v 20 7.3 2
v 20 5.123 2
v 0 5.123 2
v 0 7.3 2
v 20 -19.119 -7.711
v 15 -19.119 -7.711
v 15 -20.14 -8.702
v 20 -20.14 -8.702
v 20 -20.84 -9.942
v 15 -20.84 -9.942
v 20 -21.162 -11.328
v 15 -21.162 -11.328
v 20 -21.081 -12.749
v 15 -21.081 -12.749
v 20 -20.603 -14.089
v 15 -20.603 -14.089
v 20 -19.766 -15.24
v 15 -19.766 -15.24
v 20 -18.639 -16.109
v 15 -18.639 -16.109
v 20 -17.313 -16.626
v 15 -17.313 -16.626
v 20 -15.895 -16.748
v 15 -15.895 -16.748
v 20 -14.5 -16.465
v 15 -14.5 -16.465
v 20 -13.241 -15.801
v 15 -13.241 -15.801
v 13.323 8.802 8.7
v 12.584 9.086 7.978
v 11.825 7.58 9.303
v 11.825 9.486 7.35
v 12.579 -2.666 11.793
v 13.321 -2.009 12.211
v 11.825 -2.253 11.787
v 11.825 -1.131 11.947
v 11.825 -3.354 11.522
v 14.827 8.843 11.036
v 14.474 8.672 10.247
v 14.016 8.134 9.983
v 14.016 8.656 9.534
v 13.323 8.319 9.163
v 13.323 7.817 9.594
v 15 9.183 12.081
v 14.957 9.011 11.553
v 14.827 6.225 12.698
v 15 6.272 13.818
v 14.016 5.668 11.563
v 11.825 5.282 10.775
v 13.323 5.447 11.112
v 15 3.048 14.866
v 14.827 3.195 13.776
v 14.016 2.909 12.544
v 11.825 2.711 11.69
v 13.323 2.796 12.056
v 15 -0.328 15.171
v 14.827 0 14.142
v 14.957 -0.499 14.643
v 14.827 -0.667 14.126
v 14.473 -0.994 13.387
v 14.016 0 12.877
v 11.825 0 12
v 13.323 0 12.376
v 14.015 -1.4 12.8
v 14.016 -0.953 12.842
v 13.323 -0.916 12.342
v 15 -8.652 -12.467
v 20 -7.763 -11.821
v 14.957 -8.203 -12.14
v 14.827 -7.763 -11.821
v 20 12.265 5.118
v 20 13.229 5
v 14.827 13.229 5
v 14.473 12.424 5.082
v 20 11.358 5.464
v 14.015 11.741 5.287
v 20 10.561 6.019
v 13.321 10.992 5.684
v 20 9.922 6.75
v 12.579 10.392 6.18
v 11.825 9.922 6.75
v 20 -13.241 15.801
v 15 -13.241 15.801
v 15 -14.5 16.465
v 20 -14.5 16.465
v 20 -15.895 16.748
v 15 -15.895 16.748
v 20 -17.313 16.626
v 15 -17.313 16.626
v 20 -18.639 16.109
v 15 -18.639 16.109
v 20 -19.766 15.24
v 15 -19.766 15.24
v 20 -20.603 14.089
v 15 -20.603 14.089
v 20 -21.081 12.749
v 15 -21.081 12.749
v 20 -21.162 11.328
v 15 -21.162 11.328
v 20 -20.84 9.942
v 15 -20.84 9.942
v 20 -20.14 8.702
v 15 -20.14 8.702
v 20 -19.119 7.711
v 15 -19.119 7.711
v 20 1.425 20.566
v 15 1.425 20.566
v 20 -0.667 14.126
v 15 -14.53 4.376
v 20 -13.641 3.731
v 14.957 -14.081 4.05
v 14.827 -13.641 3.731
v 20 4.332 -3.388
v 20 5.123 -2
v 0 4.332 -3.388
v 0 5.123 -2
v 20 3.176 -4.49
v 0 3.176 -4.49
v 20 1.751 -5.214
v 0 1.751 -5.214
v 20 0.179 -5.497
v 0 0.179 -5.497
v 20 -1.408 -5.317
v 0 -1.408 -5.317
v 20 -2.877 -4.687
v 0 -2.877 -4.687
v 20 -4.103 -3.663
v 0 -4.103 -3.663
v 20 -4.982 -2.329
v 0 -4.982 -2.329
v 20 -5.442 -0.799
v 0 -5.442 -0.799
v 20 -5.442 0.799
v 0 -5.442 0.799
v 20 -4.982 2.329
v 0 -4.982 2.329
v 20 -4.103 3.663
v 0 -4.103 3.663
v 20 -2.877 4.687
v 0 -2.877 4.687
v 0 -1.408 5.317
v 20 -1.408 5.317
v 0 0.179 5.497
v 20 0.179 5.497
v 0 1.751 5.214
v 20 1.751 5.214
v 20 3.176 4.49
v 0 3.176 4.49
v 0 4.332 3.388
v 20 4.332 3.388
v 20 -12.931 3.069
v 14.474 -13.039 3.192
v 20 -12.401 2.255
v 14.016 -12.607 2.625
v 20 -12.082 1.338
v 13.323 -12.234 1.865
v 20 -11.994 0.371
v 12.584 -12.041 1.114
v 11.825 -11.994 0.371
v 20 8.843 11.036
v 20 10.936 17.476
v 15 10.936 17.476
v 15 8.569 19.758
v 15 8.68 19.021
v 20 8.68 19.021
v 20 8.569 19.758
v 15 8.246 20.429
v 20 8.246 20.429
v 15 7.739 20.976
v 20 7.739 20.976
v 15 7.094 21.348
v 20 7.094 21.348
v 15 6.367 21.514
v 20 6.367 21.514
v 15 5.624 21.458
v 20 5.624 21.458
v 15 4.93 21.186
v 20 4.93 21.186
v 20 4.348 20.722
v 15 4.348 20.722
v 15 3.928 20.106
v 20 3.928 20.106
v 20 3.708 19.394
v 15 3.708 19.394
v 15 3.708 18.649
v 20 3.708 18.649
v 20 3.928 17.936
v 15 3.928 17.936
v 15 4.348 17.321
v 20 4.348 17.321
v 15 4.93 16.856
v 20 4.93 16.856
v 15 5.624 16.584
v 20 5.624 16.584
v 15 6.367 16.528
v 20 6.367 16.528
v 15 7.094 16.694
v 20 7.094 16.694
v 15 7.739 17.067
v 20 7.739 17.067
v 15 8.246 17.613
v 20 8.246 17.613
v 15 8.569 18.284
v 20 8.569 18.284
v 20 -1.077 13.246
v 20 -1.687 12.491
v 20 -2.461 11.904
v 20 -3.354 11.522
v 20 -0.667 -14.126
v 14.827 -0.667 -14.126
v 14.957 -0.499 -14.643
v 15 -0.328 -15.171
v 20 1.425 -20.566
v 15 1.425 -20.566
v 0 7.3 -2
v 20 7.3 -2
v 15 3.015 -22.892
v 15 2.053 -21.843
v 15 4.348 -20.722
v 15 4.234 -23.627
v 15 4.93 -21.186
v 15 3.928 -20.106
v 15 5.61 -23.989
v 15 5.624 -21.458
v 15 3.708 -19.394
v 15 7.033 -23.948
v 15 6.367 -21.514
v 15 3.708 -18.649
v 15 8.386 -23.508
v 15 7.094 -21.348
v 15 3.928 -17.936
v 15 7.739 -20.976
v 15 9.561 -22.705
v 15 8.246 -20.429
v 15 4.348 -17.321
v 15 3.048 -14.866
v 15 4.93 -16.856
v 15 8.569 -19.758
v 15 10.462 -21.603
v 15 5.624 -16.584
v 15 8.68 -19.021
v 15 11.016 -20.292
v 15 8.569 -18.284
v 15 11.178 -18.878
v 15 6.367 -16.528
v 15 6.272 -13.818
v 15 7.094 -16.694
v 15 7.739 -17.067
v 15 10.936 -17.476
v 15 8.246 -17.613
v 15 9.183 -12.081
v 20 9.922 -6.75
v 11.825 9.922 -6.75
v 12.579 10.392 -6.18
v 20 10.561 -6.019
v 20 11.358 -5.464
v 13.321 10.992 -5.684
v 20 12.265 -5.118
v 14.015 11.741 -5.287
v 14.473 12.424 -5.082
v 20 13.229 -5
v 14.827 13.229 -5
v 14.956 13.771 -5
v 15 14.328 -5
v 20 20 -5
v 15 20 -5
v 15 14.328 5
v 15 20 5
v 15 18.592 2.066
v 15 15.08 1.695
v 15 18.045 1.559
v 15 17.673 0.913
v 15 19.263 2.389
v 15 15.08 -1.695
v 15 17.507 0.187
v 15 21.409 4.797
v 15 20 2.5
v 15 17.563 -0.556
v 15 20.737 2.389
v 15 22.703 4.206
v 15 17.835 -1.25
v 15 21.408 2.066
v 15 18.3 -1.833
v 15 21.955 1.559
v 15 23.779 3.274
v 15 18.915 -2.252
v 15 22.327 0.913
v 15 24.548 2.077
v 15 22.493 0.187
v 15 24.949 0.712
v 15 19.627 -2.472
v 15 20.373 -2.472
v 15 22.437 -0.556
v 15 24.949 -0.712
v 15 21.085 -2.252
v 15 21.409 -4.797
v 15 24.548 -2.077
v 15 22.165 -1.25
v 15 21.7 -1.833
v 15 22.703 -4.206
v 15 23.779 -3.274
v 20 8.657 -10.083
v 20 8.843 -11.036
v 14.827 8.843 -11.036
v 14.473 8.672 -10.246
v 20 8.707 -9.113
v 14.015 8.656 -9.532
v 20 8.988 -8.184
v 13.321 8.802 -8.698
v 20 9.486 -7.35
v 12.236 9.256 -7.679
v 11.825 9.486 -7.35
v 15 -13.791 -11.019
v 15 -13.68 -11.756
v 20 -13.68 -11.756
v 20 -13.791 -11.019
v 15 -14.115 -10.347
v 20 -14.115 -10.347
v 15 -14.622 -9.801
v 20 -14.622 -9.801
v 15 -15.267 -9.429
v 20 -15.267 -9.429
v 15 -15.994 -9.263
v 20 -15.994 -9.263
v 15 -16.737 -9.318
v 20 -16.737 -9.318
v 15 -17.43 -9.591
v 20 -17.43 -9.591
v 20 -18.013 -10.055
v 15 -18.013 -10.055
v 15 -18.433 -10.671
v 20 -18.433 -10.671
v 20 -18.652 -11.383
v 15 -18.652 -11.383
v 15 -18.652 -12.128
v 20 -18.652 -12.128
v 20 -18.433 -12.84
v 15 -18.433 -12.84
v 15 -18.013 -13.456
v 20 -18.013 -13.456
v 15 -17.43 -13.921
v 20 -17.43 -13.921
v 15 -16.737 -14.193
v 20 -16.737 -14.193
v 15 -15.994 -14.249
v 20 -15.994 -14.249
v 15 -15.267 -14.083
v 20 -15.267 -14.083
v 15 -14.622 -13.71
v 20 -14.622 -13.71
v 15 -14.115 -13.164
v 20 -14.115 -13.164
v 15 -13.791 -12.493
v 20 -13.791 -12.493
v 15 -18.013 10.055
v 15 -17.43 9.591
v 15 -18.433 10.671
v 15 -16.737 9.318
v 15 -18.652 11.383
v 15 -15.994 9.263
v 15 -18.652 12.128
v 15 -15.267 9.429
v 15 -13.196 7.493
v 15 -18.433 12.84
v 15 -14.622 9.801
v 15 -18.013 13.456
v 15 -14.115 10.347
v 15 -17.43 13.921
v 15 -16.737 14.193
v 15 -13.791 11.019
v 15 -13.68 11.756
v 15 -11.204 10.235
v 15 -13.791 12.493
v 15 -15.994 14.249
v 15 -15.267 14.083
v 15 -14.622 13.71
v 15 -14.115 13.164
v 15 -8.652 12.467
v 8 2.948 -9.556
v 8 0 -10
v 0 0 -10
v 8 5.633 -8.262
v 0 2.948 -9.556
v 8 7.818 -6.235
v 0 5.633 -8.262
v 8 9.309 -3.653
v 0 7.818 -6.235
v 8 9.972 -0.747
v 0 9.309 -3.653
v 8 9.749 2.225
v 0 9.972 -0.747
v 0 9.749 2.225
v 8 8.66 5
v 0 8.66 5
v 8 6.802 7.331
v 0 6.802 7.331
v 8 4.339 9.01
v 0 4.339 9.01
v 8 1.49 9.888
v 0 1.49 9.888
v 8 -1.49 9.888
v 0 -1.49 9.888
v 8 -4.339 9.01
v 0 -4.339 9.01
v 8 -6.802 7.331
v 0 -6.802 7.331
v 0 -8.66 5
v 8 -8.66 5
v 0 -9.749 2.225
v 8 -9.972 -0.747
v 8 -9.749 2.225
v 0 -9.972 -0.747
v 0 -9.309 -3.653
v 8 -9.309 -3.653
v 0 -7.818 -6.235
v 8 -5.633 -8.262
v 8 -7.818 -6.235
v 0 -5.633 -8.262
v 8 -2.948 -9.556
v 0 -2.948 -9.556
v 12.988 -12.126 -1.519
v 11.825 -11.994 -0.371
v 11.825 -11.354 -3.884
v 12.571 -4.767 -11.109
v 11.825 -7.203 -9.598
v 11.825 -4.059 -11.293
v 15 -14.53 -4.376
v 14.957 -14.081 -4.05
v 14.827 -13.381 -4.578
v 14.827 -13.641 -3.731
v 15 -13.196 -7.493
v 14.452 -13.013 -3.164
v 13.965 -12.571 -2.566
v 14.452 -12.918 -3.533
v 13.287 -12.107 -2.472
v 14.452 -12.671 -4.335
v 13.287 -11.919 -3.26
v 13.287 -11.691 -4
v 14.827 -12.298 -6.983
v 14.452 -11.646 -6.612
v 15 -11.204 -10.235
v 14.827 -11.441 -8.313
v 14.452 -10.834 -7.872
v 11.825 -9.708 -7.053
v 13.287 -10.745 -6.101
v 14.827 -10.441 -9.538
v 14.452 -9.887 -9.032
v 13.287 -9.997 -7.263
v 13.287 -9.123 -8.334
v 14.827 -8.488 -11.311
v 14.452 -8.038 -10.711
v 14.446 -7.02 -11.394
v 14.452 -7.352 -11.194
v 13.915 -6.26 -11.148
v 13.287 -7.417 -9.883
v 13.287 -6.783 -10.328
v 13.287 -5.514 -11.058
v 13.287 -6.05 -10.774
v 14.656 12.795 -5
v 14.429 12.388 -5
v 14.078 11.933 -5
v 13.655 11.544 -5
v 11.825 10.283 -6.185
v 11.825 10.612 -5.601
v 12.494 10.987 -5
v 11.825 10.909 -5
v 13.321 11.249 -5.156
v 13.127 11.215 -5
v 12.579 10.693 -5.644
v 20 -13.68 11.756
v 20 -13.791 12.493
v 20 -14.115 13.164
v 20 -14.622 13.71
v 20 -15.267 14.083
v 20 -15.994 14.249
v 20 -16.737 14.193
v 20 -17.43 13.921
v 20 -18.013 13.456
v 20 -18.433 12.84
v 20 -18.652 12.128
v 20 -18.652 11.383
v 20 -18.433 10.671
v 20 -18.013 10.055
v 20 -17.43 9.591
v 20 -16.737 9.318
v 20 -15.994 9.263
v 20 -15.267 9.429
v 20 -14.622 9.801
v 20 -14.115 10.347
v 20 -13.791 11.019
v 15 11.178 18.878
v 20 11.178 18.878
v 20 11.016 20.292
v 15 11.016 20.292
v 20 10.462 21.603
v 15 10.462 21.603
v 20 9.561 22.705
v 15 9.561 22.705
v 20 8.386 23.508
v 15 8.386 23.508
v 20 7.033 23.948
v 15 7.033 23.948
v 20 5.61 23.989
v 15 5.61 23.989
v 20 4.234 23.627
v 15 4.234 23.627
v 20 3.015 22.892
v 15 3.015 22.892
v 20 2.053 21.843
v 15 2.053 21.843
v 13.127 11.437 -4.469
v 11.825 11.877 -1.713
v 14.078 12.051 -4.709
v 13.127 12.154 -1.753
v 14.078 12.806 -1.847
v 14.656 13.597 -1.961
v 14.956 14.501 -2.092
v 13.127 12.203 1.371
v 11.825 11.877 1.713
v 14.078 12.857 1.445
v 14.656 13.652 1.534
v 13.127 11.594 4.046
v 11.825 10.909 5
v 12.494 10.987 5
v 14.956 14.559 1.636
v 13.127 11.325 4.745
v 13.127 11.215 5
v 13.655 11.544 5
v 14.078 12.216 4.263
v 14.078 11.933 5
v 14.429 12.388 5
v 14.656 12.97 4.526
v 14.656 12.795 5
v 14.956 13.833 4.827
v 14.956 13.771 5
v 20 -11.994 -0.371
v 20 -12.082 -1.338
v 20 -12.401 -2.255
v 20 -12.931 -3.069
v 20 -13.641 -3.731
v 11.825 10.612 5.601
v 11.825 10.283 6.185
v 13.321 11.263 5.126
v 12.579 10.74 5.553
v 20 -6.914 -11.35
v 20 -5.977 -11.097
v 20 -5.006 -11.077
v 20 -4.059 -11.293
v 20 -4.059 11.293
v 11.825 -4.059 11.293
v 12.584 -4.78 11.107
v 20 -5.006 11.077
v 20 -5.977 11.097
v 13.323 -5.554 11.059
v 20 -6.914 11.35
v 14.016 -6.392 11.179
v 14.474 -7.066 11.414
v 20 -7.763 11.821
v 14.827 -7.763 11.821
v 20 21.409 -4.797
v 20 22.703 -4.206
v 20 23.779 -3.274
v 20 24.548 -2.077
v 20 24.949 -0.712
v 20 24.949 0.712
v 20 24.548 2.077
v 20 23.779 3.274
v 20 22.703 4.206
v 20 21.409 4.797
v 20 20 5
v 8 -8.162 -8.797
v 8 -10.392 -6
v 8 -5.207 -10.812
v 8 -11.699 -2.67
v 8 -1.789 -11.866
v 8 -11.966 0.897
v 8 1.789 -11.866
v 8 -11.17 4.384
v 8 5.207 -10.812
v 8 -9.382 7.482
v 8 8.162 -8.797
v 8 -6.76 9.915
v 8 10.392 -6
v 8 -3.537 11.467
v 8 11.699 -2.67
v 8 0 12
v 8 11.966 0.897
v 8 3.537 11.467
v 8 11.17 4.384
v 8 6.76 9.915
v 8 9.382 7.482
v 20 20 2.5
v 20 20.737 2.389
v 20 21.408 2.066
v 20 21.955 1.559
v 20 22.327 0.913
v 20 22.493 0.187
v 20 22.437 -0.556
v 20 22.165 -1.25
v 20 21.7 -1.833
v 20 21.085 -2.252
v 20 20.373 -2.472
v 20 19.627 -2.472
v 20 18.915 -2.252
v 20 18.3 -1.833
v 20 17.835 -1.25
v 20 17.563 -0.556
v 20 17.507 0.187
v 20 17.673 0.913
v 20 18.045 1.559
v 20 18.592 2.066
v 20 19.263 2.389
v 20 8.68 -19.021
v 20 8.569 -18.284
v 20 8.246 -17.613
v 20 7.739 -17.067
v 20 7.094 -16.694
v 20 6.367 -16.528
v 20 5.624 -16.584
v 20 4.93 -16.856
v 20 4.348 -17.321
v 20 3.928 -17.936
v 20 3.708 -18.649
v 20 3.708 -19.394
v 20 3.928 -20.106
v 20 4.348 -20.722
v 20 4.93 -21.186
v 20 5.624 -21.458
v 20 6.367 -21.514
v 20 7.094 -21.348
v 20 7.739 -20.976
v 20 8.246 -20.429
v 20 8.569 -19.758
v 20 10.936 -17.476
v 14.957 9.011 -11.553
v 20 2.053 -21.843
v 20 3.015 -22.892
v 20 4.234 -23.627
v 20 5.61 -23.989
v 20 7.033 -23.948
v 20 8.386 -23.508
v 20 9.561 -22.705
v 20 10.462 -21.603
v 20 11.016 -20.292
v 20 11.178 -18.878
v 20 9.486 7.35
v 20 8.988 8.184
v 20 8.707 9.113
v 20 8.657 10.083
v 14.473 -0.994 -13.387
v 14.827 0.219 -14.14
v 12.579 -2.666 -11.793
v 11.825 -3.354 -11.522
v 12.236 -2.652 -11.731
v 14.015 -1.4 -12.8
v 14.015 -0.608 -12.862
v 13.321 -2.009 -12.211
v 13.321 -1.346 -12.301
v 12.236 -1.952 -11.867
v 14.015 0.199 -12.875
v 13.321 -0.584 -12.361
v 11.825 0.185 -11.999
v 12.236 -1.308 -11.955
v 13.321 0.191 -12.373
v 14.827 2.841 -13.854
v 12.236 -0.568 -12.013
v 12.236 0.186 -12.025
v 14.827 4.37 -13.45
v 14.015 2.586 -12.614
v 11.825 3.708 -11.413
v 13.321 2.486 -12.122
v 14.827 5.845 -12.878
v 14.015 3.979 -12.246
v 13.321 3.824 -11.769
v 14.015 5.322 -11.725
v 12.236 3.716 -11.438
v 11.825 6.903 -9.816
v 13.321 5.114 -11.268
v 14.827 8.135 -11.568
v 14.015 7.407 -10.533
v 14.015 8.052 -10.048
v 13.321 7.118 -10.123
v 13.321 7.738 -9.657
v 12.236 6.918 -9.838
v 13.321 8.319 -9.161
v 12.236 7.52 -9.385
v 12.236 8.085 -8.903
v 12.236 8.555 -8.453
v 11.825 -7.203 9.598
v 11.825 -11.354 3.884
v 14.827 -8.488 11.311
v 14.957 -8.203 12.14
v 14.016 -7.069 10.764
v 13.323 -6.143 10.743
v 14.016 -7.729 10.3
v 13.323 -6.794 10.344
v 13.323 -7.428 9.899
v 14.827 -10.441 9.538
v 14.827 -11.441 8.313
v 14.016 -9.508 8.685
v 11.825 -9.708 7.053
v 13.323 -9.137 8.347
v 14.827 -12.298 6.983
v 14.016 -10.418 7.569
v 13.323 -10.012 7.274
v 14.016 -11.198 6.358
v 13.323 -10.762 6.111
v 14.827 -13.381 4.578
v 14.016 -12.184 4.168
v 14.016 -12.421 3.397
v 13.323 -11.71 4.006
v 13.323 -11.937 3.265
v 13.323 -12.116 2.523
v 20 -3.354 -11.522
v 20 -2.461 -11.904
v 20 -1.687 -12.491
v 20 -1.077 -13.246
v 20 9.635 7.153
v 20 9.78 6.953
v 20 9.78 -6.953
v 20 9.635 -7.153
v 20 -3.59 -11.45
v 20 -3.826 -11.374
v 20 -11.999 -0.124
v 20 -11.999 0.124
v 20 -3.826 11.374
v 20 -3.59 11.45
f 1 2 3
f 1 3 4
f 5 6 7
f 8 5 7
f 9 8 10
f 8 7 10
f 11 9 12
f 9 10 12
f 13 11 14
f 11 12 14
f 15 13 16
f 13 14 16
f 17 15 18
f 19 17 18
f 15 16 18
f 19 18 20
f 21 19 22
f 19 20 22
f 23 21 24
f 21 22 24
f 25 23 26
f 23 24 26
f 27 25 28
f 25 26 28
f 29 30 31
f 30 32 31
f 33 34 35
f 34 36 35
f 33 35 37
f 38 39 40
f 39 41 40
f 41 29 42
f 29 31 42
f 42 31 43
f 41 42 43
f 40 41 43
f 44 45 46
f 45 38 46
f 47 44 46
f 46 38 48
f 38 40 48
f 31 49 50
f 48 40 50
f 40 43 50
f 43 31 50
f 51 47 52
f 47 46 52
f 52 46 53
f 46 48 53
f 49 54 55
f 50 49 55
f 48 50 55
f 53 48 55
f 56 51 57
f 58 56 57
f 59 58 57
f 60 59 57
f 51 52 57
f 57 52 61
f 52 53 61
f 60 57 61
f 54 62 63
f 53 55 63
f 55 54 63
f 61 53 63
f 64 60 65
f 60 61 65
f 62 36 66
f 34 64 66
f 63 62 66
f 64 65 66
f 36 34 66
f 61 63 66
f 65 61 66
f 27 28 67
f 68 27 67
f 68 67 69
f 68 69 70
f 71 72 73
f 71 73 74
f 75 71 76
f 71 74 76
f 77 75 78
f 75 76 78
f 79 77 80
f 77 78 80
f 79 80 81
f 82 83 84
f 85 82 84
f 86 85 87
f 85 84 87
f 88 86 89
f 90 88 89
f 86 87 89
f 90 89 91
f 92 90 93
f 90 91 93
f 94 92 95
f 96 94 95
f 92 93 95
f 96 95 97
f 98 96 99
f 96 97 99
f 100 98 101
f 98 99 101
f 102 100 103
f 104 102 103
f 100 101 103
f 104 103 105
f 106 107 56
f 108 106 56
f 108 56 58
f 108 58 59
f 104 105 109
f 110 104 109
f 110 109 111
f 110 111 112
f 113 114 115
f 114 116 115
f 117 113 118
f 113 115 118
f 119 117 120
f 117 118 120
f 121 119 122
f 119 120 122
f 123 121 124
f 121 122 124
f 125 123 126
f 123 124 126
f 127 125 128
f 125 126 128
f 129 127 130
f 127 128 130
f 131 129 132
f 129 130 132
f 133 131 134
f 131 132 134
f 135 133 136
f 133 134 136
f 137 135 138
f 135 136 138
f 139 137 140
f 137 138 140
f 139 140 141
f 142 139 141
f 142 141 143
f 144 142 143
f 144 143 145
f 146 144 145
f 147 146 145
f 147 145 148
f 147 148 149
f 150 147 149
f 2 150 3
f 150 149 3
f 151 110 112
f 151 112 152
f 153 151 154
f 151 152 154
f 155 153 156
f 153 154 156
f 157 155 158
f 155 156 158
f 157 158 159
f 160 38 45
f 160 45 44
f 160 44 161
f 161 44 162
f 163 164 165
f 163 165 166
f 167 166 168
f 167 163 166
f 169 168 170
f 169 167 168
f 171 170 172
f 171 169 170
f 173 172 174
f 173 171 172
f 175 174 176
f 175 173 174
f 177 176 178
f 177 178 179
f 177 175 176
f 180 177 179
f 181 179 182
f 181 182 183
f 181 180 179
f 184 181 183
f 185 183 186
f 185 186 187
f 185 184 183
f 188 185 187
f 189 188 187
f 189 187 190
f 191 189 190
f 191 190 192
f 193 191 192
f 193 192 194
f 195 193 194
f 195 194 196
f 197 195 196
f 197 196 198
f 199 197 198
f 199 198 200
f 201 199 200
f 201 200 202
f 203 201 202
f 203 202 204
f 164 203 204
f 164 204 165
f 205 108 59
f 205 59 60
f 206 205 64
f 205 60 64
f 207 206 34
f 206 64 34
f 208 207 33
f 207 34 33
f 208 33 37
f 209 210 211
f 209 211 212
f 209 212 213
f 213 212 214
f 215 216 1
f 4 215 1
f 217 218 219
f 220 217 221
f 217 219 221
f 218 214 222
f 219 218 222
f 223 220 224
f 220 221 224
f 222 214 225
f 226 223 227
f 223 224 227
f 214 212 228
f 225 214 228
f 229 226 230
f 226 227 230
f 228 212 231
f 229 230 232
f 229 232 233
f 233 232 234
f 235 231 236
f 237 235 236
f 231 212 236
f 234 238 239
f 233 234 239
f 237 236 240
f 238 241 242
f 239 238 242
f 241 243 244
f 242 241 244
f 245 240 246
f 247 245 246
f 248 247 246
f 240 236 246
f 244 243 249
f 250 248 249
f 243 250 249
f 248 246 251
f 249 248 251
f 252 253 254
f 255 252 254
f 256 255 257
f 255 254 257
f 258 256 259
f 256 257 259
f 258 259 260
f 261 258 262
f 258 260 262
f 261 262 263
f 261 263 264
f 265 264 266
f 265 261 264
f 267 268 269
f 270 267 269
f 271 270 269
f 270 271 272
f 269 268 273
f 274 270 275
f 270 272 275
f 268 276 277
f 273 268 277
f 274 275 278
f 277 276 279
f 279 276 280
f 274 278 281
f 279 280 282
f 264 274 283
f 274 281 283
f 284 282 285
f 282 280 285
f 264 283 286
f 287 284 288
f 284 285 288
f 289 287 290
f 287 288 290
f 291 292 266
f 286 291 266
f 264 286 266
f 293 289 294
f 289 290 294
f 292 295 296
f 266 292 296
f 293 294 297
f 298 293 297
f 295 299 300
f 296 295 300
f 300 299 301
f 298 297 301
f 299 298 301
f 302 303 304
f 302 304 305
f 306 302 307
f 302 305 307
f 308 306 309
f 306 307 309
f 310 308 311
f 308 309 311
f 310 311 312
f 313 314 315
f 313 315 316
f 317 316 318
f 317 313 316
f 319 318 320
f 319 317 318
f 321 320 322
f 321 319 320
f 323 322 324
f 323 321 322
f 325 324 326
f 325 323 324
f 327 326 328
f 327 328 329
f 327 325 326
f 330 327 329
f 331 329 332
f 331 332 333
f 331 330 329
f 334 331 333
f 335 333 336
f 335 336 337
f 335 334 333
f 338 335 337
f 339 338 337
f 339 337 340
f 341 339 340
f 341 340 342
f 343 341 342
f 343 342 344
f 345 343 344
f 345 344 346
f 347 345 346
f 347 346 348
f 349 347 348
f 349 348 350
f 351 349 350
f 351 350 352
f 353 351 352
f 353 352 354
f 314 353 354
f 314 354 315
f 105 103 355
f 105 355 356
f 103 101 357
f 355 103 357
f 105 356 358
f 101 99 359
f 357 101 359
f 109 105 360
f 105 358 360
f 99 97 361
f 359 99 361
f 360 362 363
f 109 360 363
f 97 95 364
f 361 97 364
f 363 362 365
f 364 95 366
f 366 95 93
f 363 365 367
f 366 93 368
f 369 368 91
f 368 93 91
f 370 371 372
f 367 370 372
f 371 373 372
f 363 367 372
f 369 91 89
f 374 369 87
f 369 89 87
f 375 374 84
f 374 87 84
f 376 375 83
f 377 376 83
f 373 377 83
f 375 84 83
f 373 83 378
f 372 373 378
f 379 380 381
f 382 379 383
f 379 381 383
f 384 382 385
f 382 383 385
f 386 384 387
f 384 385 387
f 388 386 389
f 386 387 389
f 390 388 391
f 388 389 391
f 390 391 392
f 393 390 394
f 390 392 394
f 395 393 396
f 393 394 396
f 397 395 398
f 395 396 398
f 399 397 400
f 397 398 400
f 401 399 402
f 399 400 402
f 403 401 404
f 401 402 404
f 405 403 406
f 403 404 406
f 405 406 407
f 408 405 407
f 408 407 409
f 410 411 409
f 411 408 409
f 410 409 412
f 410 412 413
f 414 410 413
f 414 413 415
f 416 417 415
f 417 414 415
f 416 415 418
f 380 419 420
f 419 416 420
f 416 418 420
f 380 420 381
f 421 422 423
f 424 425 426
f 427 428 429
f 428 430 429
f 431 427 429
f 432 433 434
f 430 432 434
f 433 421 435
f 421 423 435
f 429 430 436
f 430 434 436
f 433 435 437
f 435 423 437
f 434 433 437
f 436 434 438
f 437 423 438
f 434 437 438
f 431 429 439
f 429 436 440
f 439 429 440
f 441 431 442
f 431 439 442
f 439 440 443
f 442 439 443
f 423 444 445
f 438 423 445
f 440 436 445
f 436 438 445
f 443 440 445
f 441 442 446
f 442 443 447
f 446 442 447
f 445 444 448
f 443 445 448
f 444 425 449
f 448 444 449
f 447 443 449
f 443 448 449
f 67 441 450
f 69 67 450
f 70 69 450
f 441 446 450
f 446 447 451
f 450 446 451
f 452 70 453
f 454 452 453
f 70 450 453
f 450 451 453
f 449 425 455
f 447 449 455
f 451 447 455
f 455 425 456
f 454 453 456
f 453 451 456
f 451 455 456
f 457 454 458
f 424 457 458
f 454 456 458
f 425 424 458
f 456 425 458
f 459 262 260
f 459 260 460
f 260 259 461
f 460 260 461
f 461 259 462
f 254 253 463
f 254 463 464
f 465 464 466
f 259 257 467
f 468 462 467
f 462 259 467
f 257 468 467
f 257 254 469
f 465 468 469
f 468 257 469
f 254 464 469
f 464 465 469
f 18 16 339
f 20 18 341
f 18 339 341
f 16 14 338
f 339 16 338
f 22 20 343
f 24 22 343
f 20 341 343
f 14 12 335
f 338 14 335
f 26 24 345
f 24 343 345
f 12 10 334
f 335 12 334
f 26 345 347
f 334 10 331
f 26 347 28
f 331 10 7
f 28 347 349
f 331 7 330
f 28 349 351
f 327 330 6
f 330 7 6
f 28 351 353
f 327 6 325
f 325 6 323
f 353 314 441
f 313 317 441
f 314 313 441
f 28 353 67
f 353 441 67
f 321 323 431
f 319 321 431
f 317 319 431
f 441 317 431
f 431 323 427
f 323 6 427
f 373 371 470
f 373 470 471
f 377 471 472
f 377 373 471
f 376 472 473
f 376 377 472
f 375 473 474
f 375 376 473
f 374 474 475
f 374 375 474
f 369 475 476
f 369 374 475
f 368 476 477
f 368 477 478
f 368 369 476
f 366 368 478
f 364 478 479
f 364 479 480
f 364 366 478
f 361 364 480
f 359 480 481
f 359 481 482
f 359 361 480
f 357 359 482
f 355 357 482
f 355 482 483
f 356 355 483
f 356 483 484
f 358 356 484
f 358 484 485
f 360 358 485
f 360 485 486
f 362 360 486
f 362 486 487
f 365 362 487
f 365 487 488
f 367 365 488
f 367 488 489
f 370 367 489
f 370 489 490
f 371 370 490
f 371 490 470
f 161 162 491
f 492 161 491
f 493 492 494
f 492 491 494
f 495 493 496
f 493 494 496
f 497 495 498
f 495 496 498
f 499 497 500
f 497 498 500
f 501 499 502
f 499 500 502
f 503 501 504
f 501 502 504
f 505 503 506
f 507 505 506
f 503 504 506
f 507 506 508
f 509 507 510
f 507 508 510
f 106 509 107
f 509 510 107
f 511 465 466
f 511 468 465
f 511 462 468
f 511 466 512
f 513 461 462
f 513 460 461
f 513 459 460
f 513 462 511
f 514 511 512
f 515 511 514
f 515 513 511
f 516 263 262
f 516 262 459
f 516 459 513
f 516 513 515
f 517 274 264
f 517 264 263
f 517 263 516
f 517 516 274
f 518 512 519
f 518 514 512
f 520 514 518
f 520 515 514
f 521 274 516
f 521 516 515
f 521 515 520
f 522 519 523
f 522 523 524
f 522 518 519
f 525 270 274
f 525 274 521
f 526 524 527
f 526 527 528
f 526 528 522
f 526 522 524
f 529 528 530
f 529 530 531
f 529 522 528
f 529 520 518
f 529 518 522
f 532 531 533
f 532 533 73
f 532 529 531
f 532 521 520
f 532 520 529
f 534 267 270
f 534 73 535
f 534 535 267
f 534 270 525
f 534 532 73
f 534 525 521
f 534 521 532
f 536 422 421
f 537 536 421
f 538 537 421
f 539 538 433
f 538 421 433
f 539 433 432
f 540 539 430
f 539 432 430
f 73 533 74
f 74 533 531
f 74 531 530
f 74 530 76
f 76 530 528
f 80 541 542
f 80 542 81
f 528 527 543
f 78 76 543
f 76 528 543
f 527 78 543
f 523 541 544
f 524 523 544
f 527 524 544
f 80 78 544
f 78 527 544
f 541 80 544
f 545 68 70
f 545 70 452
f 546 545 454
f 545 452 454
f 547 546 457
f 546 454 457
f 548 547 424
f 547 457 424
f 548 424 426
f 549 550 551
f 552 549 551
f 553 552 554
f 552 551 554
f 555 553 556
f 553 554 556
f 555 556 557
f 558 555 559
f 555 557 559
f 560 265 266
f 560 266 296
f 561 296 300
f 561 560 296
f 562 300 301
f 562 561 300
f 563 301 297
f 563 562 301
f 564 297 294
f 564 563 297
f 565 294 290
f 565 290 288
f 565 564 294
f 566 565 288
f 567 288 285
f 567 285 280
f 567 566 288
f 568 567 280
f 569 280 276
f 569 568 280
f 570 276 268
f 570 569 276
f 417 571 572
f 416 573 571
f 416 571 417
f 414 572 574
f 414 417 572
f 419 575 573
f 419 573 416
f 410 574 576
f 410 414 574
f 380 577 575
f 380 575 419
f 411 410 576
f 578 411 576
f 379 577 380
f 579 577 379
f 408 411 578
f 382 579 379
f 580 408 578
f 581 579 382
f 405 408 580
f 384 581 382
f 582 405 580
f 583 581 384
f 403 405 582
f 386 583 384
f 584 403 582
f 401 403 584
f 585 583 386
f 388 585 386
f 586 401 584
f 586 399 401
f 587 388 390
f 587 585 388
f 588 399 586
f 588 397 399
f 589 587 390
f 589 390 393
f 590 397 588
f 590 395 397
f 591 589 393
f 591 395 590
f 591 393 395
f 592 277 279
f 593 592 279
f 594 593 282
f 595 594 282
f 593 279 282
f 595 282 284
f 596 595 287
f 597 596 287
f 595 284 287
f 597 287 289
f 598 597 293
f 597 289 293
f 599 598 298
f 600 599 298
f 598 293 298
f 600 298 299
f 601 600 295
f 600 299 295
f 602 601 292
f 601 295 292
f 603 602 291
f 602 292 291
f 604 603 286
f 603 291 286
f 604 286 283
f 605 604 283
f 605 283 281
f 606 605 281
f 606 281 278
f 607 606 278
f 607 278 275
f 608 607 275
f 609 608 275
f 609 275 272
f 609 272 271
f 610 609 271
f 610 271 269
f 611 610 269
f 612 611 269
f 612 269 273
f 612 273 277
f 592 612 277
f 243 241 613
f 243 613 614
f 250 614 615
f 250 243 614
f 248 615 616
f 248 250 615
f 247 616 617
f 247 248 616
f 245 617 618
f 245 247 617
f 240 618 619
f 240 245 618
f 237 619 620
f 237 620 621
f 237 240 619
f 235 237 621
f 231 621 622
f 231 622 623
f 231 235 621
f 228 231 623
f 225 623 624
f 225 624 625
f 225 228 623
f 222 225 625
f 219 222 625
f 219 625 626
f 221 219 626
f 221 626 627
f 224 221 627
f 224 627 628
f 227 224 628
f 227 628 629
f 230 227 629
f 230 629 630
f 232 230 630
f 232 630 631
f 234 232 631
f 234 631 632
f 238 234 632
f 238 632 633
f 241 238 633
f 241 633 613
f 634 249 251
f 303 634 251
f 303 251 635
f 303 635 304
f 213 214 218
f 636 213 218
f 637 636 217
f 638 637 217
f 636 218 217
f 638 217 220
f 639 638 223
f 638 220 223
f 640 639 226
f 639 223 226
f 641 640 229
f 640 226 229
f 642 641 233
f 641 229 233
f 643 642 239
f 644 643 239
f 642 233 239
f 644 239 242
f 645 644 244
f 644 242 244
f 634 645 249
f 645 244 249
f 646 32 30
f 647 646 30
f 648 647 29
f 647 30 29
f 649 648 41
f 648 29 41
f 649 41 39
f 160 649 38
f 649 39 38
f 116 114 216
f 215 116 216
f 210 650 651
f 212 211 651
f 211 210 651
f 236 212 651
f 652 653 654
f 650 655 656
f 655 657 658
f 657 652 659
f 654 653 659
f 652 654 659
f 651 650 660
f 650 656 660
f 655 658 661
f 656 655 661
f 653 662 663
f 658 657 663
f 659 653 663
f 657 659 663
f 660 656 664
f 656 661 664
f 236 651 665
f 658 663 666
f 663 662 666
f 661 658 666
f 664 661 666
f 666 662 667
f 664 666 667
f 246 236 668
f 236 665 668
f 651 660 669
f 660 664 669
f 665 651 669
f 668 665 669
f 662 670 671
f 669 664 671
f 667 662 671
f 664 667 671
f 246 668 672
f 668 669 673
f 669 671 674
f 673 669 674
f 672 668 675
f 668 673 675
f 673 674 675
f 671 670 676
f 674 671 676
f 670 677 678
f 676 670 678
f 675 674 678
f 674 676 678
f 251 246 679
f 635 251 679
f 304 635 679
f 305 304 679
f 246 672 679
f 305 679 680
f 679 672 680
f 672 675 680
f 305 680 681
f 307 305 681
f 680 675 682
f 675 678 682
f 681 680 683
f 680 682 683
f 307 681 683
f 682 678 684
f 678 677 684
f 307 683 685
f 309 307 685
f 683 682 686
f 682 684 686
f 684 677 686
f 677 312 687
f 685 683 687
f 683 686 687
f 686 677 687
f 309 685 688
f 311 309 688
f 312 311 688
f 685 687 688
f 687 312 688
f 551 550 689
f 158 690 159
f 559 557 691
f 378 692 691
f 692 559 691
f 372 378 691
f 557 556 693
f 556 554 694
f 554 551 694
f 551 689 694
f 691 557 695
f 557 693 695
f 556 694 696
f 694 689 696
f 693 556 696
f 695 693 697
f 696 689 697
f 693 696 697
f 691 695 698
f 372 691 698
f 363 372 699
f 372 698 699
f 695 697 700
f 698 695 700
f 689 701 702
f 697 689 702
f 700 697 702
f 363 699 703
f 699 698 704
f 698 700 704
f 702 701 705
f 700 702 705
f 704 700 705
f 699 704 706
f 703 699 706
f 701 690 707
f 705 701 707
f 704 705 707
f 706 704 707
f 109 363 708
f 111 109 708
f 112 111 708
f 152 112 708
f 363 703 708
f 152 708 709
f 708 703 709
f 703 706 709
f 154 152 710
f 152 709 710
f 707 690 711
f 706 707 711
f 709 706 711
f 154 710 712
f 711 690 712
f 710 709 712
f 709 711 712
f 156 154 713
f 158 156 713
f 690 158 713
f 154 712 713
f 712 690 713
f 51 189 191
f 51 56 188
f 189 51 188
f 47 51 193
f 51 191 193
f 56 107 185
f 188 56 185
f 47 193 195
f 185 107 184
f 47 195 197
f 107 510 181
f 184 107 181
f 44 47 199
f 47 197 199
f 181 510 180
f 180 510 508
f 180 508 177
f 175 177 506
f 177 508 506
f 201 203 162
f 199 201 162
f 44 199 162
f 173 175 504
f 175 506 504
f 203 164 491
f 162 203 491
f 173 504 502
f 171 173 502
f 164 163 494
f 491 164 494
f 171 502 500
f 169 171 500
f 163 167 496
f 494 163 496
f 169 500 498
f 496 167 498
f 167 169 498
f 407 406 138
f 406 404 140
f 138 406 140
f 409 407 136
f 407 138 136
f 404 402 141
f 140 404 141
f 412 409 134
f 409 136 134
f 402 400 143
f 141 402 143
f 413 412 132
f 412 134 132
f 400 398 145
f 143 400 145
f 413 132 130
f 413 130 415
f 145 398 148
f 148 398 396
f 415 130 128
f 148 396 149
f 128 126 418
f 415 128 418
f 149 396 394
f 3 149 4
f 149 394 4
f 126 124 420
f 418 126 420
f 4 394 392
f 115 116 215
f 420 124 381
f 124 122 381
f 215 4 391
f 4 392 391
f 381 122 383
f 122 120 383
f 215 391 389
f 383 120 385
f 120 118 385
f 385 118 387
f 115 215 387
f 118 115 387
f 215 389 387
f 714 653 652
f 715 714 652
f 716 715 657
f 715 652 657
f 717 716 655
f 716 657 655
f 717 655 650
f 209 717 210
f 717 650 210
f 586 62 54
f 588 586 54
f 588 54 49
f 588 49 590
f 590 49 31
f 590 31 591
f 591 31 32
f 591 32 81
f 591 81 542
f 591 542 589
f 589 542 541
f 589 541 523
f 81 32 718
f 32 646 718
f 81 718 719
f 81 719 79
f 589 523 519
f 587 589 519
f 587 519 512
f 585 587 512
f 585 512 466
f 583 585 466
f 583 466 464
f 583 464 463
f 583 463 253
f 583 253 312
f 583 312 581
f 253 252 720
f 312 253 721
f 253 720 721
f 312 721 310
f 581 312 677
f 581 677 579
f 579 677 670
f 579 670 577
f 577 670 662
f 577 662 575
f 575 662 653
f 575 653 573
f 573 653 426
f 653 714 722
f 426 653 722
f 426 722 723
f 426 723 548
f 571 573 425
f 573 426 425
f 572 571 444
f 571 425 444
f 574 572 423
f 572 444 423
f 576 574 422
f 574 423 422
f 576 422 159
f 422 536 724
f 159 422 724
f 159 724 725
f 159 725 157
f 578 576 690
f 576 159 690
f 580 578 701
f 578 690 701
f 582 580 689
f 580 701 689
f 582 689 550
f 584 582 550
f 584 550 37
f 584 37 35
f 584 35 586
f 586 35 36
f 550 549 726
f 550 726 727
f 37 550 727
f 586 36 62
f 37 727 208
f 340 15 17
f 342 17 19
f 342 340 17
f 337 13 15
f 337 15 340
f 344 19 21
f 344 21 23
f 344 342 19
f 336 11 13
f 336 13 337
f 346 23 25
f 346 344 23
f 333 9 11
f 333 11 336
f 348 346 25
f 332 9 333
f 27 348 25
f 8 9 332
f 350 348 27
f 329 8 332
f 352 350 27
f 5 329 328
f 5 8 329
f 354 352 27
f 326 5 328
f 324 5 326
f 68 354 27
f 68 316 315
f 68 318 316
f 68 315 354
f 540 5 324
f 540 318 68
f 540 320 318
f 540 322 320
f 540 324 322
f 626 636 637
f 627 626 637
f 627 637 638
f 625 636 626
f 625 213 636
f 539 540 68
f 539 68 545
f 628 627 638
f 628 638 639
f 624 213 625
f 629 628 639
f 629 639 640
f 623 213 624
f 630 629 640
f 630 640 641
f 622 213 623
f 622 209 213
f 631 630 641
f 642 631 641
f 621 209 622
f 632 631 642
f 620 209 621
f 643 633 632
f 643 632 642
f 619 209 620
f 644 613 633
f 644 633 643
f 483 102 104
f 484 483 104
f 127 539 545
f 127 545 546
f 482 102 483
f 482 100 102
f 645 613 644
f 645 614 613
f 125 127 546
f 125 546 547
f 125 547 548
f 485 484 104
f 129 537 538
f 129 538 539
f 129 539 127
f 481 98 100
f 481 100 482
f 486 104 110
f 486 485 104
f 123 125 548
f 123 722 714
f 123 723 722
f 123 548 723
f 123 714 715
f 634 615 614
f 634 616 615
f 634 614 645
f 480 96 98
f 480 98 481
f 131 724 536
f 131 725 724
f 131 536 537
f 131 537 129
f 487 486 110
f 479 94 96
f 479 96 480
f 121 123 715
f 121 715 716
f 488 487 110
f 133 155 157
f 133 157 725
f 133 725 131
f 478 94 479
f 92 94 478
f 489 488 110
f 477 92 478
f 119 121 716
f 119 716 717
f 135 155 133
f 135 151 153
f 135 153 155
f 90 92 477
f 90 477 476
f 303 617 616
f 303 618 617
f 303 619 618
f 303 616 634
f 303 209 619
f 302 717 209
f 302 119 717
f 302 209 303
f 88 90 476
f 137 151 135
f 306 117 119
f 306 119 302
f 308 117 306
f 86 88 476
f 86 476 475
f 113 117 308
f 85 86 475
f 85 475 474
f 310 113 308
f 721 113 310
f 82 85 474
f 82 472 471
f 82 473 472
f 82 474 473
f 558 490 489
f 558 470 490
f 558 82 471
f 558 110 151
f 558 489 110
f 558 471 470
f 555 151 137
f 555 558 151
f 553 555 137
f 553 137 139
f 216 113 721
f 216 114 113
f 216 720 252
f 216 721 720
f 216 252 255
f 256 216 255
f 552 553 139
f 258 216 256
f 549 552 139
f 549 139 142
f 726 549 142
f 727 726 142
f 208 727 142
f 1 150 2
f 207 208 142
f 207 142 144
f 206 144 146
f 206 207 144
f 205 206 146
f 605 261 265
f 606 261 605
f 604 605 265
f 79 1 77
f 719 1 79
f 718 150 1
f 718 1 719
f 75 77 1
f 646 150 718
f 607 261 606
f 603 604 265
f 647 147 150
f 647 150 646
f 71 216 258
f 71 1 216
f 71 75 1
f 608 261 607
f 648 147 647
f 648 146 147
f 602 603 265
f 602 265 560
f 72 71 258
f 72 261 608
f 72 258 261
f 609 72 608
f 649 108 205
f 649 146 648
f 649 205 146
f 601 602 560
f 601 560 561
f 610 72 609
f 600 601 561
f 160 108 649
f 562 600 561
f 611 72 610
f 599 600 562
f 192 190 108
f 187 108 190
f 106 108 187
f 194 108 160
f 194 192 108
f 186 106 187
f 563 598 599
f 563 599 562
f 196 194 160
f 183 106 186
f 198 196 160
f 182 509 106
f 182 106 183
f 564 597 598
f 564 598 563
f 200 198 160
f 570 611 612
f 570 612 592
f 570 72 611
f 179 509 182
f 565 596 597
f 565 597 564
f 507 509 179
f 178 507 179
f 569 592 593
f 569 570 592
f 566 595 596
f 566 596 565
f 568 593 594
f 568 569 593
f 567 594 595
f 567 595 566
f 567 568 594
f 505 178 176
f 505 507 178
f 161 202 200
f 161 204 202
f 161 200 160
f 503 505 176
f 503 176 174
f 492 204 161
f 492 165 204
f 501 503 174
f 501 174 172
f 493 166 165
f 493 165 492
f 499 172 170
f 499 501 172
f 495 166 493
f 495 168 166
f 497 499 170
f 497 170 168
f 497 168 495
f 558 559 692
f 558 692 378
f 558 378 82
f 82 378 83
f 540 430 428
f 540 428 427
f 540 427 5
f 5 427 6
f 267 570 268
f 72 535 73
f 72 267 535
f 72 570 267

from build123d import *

# Parameters (mm, degrees)
SKETCH1_R                = 10
BOSS_EXTRUDE2_DEPTH      = 20
SKETCH5_R                = 12
BOSS_EXTRUDE3_DEPTH      = 12
BOSS_EXTRUDE4_DEPTH      = 5
FILLET2_R                = 3.175
F_5_0_5_DIAMETER_HOLE1_D = 5
FILLET1_START            = 15.0000001
FILLET1_DEPTH            = 4.9999999
FILLET1_START_2          = 11.8249999
FILLET1_2_DEPTH          = 3.1750001
CIRPATTERN6_START        = 11.8249999
CIRPATTERN6_OUTLINE_R    = 2.5
CIRPATTERN6_DEPTH        = 8.1750001
SKETCH2_R                = 5.5
SHAFT_HOLE_DEPTH         = 41.025175904
SKETCH3_W                = 4
SKETCH3_H                = 3.6
KEYWAY_DEPTH             = 41.025175904


with BuildPart() as part:
    # Sketch1 → Boss-Extrude2 (new body)
    with BuildSketch(Plane(origin=(0, 0, 0), x_dir=(0, 0, -1), z_dir=(1, 0, 0))):
        Circle(SKETCH1_R)
    extrude(amount=BOSS_EXTRUDE2_DEPTH)

    # Sketch5 → Boss-Extrude3 (add)
    with BuildSketch(Plane.ZY.offset(-20)):
        Circle(SKETCH5_R)
    extrude(amount=BOSS_EXTRUDE3_DEPTH)

    # Sketch6 → Boss-Extrude4 (add)
    with BuildSketch(Plane(origin=(20, 0, 0), x_dir=(0, 0, -1), z_dir=(1, 0, 0))):
        with BuildLine():
            Line((-5, 20), (-5, 0))
            Line((-5, 0), (5, 0))
            Line((5, 0), (5, 20))
            ThreePointArc((5, 20), (0, 25), (-5, 20))
        make_face()
    extrude(amount=-BOSS_EXTRUDE4_DEPTH)

    # Fillet2
    fillet2_edges = [part.edges().sort_by_distance(p)[0] for p in [
        (15, 12, 0),
    ]]
    fillet(fillet2_edges, radius=FILLET2_R)

    # Ø5.0 (5) Diameter Hole1 (through all)
    with Locations(Plane(origin=(20, 0, 0), x_dir=(0, 0, -1), z_dir=(1, 0, 0))):
        with Locations((0, 20)):
            Hole(F_5_0_5_DIAMETER_HOLE1_D / 2)

    # Fillet1: read off the stored shape, not the designer's step
    # Fillet1 outline → Fillet1 (add)
    with BuildSketch(Plane.YZ.offset(FILLET1_START)):
        with BuildLine():
            ThreePointArc((9.921567416, -6.75), (11.357927862, -5.464466094), (13.228756555, -5))
            Line((13.228756555, -5), (10.908712115, -5))
            ThreePointArc((10.908712115, -5), (10.451830526, -5.895696622), (9.921567416, -6.75))
        make_face()
        with BuildLine():
            ThreePointArc((13.228756555, 5), (11.357927862, 5.464466094), (9.921567416, 6.75))
            ThreePointArc((9.921567416, 6.75), (10.451830526, 5.895696622), (10.908712115, 5))
            Line((10.908712115, 5), (13.228756555, 5))
        make_face()
    extrude(amount=FILLET1_DEPTH)

    # Fillet1 2 outline → Fillet1 2 (add)
    with BuildSketch(Plane.YZ.offset(FILLET1_START_2)):
        with BuildLine():
            ThreePointArc((9.921567416, -6.75), (11.357927862, -5.464466094), (13.228756555, -5))
            Line((13.228756555, -5), (10.908712115, -5))
            ThreePointArc((10.908712115, -5), (10.451830526, -5.895696622), (9.921567416, -6.75))
        make_face()
        with BuildLine():
            ThreePointArc((13.228756555, 5), (11.357927862, 5.464466094), (9.921567416, 6.75))
            ThreePointArc((9.921567416, 6.75), (10.451830526, 5.895696622), (10.908712115, 5))
            Line((10.908712115, 5), (13.228756555, 5))
        make_face()
    extrude(amount=FILLET1_2_DEPTH)

    # Fillet1 3 outline → Fillet1 3 (revolve, cut)
    with BuildSketch(Plane.YX):
        with BuildLine():
            Line((15.175, 11.8249999), (15.175, 15))
            ThreePointArc((15.175, 15), (12.92993597, 14.07006403), (12, 11.825))
            Line((12, 11.825), (15.175, 11.8249999))
        make_face()
    revolve(axis=Axis((0, 0, 0), (1, 0, 0)), mode=Mode.SUBTRACT)

    # CirPattern6: read off the stored shape, not the designer's step
    # CirPattern6 outline → CirPattern6 (add)
    # profile 1 of 4: a face of its own
    with BuildSketch(Plane.YZ.offset(CIRPATTERN6_START)):
        with BuildLine():
            Line((8.843193172, 11.036210153), (10.935622469, 17.476045354))
            ThreePointArc((10.935622469, 17.476045354), (7.725424859, 23.776412907), (1.425057306, 20.566215298))
            Line((1.425057306, 20.566215298), (-0.667371991, 14.126380096))
            ThreePointArc((-0.667371991, 14.126380096), (-1.687223357, 12.490644193), (-3.353698542, 11.521836055))
            ThreePointArc((-3.353698542, 11.521836055), (3.708203933, 11.412678195), (9.485564428, 7.350106631))
            ThreePointArc((9.485564428, 7.350106631), (8.706808817, 9.113418416), (8.843193172, 11.036210153))
        make_face()
        with Locations((6.180339887, 19.021130326)):
            Circle(CIRPATTERN6_OUTLINE_R, mode=Mode.SUBTRACT)
    # profile 2 of 4: a face of its own
    with BuildSketch(Plane.YZ.offset(CIRPATTERN6_START)):
        with BuildLine():
            ThreePointArc((-11.994267104, 0.370886295), (-9.708203933, 7.053423027), (-4.059166198, 11.292615719))
            ThreePointArc((-4.059166198, 11.292615719), (-5.976824079, 11.096868429), (-7.763362606, 11.820752981))
            Line((-7.763362606, 11.820752981), (-13.241413626, 15.800790018))
            ThreePointArc((-13.241413626, 15.800790018), (-20.225424859, 14.694631307), (-19.119266149, 7.710620074))
            Line((-19.119266149, 7.710620074), (-13.641215129, 3.730583038))
            ThreePointArc((-13.641215129, 3.730583038), (-12.400689243, 2.255176559), (-11.994267104, 0.370886295))
        make_face()
        with Locations((-16.180339887, 11.755705046)):
            Circle(CIRPATTERN6_OUTLINE_R, mode=Mode.SUBTRACT)
    # profile 3 of 4: a face of its own
    with BuildSketch(Plane.YZ.offset(CIRPATTERN6_START)):
        with BuildLine():
            ThreePointArc((8.843193172, -11.036210153), (8.706808817, -9.113418416), (9.485564428, -7.350106631))
            ThreePointArc((9.485564428, -7.350106631), (3.708203933, -11.412678195), (-3.353698542, -11.521836055))
            ThreePointArc((-3.353698542, -11.521836055), (-1.687223357, -12.490644193), (-0.667371991, -14.126380096))
            Line((-0.667371991, -14.126380096), (1.425057306, -20.566215298))
            ThreePointArc((1.425057306, -20.566215298), (7.725424859, -23.776412907), (10.935622469, -17.476045354))
            Line((10.935622469, -17.476045354), (8.843193172, -11.036210153))
        make_face()
        with Locations((6.180339887, -19.021130326)):
            Circle(CIRPATTERN6_OUTLINE_R, mode=Mode.SUBTRACT)
    # profile 4 of 4: a face of its own
    with BuildSketch(Plane.YZ.offset(CIRPATTERN6_START)):
        with BuildLine():
            ThreePointArc((-4.059166198, -11.292615719), (-9.708203933, -7.053423027), (-11.994267104, -0.370886295))
            ThreePointArc((-11.994267104, -0.370886295), (-12.400689243, -2.255176559), (-13.641215129, -3.730583038))
            Line((-13.641215129, -3.730583038), (-19.119266149, -7.710620074))
            ThreePointArc((-19.119266149, -7.710620074), (-20.225424859, -14.694631307), (-13.241413626, -15.800790018))
            Line((-13.241413626, -15.800790018), (-7.763362606, -11.820752981))
            ThreePointArc((-7.763362606, -11.820752981), (-5.976824079, -11.096868429), (-4.059166198, -11.292615719))
        make_face()
        with Locations((-16.180339887, -11.755705046)):
            Circle(CIRPATTERN6_OUTLINE_R, mode=Mode.SUBTRACT)
    extrude(amount=CIRPATTERN6_DEPTH)

    # CirPattern6 2 outline → CirPattern6 2 (revolve, cut)
    with BuildSketch(Plane.YX):
        with BuildLine():
            Line((25, 15), (15.175, 15))
            ThreePointArc((15.175, 15), (12.92993597, 14.07006403), (12, 11.825))
            Line((12, 11.825), (25, 11.8249999))
            Line((25, 11.8249999), (25, 15))
        make_face()
    revolve(axis=Axis((0, 0, 0), (1, 0, 0)), mode=Mode.SUBTRACT)

    # Sketch2 → Shaft hole (cut, through all)
    with BuildSketch(Plane.ZY):
        Circle(SKETCH2_R)
    extrude(amount=-SHAFT_HOLE_DEPTH, mode=Mode.SUBTRACT)

    # Sketch3 → Keyway (cut, through all)
    with BuildSketch(Plane.ZY):
        with Locations((0, 5.5)):
            Rectangle(SKETCH3_W, SKETCH3_H)
    extrude(amount=-KEYWAY_DEPTH, mode=Mode.SUBTRACT)


solid = part.part
